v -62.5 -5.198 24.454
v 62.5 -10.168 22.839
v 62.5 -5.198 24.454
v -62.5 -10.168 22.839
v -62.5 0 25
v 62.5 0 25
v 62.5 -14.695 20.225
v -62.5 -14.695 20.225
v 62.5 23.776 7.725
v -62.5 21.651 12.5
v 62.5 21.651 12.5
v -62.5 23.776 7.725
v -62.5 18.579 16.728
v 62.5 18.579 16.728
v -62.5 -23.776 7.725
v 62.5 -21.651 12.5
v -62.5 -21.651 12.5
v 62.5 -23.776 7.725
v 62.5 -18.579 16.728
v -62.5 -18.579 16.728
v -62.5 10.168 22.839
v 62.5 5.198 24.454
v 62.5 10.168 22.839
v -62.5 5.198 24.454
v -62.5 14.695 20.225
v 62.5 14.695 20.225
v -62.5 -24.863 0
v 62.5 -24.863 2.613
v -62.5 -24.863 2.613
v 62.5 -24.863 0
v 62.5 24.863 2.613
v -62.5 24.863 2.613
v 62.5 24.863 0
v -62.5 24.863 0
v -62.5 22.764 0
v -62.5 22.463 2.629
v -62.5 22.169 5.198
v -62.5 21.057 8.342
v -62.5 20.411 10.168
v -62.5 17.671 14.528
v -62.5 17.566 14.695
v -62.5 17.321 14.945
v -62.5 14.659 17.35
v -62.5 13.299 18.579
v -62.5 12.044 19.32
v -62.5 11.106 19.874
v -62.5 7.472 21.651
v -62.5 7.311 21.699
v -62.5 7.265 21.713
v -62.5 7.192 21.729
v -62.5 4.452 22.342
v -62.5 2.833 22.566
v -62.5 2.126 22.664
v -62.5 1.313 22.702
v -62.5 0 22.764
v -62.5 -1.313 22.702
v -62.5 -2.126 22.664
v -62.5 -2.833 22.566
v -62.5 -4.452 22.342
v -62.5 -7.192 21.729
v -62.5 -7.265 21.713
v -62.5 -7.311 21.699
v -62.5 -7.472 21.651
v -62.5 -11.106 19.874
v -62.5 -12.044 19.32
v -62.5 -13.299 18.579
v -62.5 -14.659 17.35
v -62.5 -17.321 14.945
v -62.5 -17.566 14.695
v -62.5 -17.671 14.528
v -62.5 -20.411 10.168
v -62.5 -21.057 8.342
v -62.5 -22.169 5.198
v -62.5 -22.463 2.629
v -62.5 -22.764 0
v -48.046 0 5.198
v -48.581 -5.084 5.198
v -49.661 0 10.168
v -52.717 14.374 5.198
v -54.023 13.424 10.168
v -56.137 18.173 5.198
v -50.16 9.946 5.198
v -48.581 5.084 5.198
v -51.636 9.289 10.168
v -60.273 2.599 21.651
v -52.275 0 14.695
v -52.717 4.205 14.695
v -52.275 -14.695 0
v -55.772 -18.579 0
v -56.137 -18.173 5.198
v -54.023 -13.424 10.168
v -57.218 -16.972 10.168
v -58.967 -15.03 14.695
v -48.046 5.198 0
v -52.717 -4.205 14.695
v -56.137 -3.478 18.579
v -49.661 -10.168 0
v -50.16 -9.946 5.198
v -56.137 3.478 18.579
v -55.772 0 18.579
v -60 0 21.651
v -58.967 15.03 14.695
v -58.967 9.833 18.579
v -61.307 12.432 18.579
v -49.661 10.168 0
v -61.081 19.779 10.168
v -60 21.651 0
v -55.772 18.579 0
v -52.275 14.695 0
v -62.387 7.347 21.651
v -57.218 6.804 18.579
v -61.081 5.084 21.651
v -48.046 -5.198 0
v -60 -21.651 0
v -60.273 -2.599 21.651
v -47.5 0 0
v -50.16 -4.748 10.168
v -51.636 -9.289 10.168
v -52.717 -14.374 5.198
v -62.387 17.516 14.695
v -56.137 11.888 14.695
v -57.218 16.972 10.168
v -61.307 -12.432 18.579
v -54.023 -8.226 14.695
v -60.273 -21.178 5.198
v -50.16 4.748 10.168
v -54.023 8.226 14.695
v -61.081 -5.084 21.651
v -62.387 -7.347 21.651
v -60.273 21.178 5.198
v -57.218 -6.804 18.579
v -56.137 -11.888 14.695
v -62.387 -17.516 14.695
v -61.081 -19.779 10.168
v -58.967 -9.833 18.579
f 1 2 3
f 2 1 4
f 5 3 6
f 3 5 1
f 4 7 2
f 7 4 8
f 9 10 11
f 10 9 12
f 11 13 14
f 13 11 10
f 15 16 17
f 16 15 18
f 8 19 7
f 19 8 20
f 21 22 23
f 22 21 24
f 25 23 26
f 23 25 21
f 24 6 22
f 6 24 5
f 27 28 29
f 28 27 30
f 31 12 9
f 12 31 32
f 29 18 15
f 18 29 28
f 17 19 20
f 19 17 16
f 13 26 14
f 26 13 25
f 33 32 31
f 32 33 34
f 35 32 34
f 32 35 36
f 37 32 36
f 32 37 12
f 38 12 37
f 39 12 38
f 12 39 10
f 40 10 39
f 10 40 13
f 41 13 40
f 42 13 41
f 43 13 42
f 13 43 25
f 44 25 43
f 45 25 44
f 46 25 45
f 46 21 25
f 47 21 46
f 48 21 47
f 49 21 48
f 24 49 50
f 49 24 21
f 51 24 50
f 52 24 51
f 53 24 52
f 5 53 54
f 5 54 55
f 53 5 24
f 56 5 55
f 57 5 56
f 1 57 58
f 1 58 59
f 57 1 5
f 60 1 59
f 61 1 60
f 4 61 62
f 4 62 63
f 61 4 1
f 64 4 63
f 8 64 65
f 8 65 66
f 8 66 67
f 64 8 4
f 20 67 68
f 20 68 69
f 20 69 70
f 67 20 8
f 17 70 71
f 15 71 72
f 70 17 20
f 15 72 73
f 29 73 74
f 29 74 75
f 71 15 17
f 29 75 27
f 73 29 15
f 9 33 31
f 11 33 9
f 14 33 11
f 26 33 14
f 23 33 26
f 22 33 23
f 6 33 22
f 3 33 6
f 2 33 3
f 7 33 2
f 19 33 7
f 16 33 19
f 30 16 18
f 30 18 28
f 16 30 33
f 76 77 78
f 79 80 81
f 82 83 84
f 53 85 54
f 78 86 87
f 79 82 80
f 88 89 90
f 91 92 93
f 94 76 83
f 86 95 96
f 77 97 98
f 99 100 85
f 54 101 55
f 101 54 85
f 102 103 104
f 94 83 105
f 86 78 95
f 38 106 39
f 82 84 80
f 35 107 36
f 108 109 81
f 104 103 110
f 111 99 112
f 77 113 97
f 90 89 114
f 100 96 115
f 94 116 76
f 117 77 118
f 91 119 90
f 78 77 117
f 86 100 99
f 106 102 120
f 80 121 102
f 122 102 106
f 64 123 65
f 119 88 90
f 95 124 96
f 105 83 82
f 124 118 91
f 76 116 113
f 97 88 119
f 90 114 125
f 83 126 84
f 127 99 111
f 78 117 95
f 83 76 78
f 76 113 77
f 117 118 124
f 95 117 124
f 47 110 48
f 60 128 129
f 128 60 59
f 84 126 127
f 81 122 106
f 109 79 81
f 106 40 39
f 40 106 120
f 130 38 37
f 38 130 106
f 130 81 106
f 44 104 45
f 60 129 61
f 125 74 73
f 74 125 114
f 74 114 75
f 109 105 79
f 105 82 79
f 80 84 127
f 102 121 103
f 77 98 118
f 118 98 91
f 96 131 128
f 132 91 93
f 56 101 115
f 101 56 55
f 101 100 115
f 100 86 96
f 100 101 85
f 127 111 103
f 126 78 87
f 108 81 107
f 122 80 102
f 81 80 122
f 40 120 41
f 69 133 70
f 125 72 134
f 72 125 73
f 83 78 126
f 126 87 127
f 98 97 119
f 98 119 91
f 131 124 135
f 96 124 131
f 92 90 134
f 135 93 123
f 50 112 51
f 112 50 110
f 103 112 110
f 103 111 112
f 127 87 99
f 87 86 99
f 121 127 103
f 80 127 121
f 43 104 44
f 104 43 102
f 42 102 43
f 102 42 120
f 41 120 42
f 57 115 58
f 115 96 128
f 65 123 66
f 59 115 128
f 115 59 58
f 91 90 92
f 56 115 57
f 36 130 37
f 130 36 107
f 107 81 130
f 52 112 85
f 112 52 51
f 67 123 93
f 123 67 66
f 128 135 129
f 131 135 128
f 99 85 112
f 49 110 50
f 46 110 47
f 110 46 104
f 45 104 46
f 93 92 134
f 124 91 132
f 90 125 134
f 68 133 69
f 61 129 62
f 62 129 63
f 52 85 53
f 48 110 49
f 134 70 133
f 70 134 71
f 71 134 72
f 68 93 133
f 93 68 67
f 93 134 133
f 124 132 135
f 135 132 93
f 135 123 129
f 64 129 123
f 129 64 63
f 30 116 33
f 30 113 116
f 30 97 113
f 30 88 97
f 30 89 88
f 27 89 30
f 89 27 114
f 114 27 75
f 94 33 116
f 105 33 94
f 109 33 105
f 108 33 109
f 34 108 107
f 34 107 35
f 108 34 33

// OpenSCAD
// A sphere scooped from a cylinder's end, then halved by a plane through
// the scoop's equator. Unifying the scooped shape once inflated a vertex
// tolerance to half the model, and the plane cut then kept both halves.
difference() {
  difference() {
    rotate(a = 180, v = [1, 0, 1]) cylinder(h = 125, r = 25, center = true);
    translate([-72.5, 0, 0]) sphere(25);
  }
  translate([0, 0, -100]) cube(200, center = true);
}
